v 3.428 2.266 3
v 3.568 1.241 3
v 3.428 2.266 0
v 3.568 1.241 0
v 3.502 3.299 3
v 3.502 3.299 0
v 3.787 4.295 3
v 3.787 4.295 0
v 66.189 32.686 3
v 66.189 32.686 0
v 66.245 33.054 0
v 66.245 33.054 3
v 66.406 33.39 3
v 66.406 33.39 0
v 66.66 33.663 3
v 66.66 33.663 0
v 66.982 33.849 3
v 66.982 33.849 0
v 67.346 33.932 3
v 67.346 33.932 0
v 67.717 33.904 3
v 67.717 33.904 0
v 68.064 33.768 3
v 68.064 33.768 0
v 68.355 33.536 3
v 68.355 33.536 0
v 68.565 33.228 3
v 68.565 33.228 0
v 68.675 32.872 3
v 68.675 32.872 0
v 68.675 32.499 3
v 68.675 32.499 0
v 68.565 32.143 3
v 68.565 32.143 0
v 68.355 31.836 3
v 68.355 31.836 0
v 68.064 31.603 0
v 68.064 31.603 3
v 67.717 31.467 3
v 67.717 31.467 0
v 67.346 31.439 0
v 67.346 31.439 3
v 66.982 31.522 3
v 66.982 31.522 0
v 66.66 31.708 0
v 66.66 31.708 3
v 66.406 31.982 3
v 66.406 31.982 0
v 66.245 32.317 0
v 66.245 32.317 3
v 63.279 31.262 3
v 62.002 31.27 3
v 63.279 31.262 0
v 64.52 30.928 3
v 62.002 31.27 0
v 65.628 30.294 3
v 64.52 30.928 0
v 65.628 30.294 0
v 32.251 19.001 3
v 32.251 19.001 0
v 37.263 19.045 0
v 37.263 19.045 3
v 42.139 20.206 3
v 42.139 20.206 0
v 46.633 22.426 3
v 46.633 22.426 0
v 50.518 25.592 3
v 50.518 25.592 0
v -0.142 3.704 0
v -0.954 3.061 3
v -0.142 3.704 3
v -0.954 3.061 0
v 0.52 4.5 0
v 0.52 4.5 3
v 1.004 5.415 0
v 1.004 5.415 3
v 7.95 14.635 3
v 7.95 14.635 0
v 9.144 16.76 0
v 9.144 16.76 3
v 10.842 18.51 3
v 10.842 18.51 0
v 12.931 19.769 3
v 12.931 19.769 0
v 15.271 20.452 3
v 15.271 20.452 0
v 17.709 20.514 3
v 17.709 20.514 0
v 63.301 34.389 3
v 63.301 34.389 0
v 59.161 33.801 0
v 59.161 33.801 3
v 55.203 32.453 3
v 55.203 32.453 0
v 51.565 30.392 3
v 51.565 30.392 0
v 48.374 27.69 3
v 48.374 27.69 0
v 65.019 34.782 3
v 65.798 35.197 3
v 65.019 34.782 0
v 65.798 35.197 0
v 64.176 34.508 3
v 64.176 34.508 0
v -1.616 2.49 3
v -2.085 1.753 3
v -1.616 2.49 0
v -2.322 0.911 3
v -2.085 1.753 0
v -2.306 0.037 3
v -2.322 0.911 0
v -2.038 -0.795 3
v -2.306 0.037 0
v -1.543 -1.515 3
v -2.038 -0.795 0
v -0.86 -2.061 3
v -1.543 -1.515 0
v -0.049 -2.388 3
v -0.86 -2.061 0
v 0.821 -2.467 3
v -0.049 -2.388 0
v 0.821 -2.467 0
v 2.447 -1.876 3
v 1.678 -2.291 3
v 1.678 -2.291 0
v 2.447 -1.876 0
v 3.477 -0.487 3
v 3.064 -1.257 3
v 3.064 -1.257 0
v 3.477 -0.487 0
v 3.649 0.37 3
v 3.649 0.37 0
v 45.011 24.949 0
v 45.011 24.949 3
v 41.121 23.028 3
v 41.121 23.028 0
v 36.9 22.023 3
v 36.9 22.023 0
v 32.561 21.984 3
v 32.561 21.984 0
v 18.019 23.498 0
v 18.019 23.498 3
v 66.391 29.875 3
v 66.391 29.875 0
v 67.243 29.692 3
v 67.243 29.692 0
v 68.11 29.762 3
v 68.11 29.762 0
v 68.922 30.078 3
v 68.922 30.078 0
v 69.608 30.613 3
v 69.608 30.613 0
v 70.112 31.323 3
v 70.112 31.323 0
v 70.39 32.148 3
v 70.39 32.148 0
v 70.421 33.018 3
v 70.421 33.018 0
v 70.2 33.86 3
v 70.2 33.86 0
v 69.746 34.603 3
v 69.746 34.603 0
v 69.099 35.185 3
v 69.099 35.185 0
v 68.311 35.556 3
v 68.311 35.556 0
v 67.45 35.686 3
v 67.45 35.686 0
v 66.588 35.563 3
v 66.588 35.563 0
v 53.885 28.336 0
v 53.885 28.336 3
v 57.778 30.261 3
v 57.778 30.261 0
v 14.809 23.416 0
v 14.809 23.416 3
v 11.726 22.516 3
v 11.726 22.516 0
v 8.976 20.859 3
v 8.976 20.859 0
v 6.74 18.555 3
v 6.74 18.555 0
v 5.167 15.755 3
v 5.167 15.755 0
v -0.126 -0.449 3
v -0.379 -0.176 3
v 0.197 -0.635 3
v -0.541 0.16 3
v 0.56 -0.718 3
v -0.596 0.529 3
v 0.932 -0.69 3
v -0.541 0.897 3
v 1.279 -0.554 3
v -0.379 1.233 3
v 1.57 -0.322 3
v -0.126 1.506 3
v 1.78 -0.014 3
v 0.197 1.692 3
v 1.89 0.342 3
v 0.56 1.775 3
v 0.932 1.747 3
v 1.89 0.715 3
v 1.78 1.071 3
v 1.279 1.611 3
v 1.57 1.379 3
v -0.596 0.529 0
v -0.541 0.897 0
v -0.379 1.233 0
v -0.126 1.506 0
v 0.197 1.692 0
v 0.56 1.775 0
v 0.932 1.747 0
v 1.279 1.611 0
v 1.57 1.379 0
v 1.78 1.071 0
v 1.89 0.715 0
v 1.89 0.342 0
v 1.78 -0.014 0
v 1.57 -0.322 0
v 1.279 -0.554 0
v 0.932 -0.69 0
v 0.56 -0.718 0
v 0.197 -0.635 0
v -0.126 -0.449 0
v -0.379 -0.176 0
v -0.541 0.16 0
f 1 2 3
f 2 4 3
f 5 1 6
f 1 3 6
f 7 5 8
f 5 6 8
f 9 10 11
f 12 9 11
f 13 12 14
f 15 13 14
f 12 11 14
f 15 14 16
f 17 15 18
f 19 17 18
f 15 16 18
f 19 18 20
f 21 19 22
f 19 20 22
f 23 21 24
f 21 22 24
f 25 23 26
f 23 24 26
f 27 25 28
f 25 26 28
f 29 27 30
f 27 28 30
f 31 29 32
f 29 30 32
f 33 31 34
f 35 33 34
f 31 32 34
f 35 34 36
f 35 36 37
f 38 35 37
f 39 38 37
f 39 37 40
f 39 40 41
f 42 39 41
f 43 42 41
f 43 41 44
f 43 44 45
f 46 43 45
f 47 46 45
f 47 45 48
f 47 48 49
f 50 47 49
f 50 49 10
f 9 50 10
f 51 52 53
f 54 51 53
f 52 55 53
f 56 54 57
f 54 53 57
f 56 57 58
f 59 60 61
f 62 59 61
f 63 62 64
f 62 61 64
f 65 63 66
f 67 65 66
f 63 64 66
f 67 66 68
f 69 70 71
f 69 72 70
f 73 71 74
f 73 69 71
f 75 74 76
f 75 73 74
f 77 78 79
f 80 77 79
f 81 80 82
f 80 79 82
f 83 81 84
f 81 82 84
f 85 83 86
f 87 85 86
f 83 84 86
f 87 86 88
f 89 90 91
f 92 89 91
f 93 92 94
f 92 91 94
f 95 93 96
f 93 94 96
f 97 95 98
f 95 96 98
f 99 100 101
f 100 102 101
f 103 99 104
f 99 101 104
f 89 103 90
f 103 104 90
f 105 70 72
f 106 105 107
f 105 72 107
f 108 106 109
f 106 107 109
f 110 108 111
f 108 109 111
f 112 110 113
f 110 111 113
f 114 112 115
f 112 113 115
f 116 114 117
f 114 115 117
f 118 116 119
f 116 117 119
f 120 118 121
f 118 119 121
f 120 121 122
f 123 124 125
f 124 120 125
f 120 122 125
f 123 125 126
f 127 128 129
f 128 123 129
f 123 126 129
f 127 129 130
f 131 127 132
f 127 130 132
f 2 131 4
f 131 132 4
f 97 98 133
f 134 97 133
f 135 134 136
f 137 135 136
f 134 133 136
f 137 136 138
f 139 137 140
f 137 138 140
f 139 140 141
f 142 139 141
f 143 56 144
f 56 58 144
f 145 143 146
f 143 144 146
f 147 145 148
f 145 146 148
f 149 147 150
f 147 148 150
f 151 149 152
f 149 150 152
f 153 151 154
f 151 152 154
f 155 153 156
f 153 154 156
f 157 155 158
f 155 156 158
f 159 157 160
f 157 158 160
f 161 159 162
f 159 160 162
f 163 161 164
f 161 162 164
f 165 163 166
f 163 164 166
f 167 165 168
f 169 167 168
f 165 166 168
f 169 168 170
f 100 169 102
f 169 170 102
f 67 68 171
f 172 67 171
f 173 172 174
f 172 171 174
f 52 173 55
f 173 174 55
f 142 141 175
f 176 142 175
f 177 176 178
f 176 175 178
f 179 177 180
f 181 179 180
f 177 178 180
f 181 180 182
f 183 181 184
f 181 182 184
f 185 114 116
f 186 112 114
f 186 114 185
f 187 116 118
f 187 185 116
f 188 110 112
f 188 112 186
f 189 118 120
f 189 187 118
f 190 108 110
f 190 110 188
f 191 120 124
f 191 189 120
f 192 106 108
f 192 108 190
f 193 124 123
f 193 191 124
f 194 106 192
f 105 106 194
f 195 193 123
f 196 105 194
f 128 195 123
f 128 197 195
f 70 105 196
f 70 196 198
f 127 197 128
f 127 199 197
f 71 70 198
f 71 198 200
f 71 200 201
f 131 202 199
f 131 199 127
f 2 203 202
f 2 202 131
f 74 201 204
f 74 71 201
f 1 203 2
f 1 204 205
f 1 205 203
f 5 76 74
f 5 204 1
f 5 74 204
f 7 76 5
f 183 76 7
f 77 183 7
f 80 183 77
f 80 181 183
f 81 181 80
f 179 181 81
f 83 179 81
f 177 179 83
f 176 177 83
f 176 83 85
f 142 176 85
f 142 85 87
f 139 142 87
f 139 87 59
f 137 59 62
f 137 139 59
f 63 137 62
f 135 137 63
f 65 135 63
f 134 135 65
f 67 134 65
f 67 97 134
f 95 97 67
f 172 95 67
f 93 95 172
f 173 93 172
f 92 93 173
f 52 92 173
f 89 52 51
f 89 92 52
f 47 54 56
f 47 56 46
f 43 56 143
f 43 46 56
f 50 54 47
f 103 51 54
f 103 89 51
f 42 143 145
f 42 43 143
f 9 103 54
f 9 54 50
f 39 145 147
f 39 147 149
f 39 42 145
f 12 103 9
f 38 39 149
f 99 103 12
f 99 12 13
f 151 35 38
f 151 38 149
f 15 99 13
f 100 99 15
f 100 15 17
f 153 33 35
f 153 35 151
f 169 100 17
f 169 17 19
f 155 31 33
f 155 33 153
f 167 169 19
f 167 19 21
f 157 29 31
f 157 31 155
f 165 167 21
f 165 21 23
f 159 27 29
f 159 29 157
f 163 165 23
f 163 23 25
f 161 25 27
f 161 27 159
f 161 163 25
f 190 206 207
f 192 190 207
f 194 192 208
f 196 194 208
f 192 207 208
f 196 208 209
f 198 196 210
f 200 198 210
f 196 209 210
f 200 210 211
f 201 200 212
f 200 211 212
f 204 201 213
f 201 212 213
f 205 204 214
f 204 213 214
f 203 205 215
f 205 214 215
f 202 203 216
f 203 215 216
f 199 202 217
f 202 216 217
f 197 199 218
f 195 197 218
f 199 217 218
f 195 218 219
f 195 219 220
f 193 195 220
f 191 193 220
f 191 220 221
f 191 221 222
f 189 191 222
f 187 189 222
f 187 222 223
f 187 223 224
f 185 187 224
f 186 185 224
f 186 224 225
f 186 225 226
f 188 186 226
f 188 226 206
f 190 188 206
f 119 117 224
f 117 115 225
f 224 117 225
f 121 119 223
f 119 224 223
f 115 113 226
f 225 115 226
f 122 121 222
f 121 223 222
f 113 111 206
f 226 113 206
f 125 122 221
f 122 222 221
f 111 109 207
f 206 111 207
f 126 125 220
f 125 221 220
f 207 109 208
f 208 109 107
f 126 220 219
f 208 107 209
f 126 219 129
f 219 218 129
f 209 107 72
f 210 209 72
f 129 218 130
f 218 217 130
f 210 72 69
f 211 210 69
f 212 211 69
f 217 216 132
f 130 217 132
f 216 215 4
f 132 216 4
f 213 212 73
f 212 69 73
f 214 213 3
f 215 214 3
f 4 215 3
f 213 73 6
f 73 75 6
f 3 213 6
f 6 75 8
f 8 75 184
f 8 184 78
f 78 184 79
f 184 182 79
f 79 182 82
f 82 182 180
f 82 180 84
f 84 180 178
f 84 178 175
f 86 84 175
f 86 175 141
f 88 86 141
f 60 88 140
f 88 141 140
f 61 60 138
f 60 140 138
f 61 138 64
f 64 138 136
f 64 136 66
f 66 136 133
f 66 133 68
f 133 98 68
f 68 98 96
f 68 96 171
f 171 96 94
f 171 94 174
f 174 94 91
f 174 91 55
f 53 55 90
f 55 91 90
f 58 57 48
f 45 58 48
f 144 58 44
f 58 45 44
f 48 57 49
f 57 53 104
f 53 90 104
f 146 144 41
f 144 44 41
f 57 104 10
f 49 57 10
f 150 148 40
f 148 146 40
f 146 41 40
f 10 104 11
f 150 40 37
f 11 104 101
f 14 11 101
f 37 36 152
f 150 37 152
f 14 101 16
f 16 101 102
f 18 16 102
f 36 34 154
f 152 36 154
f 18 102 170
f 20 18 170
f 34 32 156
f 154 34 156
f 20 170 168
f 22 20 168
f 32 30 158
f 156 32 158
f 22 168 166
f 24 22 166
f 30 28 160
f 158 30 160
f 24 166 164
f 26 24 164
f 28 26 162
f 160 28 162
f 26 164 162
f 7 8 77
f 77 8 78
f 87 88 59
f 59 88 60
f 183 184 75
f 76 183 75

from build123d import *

# Parameters (mm, degrees)
EXTRUDE_THIN1_DEPTH   = 3
SKETCH1_3_R           = 3
BOSS_EXTRUDE1_DEPTH   = 3
FILLET1_R             = 5
F_2_5MM_DOWEL_HOLE1_D = 2.5


with BuildPart() as part:
    # Sketch1 → Extrude-Thin1 (new body)
    with BuildSketch(Plane.XY):
        with BuildLine():
            ThreePointArc((67.660273857, 34.169358704), (57.237958415, 33.249482811), (48.374242711, 27.690222541))
            ThreePointArc((48.374242711, 27.690222541), (41.120514889, 23.027861475), (32.560988498, 21.984460302))
            Line((32.560988498, 21.984460302), (18.0194176, 23.497567077))
            ThreePointArc((18.0194176, 23.497567077), (10.297542455, 21.776854665), (5.1667157, 15.754992513))
            Line((5.1667157, 15.754992513), (-0.737799909, 1.088733357))
            Line((-0.737799909, 1.088733357), (2.04513605, -0.031653828))
            Line((2.04513605, -0.031653828), (7.949651659, 14.634605328))
            ThreePointArc((7.949651659, 14.634605328), (11.845577871, 19.207110251), (17.7089323, 20.513677186))
            Line((17.7089323, 20.513677186), (32.250503198, 19.000570412))
            ThreePointArc((32.250503198, 19.000570412), (42.138725285, 20.205938799), (50.518449629, 25.592038399))
            ThreePointArc((50.518449629, 25.592038399), (58.193335463, 30.40567292), (67.217776658, 31.202172119))
            Line((67.217776658, 31.202172119), (67.660273857, 34.169358704))
        make_face()
    extrude(amount=EXTRUDE_THIN1_DEPTH)

    # Sketch1<3> → Boss-Extrude1 (add, through all)
    with BuildSketch(Plane.XY):
        with Locations((0.653668071, 0.528539764)):
            Circle(SKETCH1_3_R)
        with Locations((67.439025258, 32.685765412)):
            Circle(SKETCH1_3_R)
    extrude(amount=BOSS_EXTRUDE1_DEPTH)

    # Fillet1
    fillet1_edges = [part.edges().sort_by_distance(p)[0] for p in [
        (0.232483855, 3.498826595, 1.5),
        (3.015419815, 2.37843941, 1.5),
        (64.723514108, 31.410618677, 1.5),
        (64.980819062, 34.405423023, 1.5),
    ]]
    fillet(fillet1_edges, radius=FILLET1_R)

    # Ø2.5mm Dowel Hole1 (through all)
    with Locations(Plane.XY.offset(3)):
        with Locations((67.439025258, 32.685765412), (0.653668071, 0.528539764)):
            Hole(F_2_5MM_DOWEL_HOLE1_D / 2)


solid = part.part
